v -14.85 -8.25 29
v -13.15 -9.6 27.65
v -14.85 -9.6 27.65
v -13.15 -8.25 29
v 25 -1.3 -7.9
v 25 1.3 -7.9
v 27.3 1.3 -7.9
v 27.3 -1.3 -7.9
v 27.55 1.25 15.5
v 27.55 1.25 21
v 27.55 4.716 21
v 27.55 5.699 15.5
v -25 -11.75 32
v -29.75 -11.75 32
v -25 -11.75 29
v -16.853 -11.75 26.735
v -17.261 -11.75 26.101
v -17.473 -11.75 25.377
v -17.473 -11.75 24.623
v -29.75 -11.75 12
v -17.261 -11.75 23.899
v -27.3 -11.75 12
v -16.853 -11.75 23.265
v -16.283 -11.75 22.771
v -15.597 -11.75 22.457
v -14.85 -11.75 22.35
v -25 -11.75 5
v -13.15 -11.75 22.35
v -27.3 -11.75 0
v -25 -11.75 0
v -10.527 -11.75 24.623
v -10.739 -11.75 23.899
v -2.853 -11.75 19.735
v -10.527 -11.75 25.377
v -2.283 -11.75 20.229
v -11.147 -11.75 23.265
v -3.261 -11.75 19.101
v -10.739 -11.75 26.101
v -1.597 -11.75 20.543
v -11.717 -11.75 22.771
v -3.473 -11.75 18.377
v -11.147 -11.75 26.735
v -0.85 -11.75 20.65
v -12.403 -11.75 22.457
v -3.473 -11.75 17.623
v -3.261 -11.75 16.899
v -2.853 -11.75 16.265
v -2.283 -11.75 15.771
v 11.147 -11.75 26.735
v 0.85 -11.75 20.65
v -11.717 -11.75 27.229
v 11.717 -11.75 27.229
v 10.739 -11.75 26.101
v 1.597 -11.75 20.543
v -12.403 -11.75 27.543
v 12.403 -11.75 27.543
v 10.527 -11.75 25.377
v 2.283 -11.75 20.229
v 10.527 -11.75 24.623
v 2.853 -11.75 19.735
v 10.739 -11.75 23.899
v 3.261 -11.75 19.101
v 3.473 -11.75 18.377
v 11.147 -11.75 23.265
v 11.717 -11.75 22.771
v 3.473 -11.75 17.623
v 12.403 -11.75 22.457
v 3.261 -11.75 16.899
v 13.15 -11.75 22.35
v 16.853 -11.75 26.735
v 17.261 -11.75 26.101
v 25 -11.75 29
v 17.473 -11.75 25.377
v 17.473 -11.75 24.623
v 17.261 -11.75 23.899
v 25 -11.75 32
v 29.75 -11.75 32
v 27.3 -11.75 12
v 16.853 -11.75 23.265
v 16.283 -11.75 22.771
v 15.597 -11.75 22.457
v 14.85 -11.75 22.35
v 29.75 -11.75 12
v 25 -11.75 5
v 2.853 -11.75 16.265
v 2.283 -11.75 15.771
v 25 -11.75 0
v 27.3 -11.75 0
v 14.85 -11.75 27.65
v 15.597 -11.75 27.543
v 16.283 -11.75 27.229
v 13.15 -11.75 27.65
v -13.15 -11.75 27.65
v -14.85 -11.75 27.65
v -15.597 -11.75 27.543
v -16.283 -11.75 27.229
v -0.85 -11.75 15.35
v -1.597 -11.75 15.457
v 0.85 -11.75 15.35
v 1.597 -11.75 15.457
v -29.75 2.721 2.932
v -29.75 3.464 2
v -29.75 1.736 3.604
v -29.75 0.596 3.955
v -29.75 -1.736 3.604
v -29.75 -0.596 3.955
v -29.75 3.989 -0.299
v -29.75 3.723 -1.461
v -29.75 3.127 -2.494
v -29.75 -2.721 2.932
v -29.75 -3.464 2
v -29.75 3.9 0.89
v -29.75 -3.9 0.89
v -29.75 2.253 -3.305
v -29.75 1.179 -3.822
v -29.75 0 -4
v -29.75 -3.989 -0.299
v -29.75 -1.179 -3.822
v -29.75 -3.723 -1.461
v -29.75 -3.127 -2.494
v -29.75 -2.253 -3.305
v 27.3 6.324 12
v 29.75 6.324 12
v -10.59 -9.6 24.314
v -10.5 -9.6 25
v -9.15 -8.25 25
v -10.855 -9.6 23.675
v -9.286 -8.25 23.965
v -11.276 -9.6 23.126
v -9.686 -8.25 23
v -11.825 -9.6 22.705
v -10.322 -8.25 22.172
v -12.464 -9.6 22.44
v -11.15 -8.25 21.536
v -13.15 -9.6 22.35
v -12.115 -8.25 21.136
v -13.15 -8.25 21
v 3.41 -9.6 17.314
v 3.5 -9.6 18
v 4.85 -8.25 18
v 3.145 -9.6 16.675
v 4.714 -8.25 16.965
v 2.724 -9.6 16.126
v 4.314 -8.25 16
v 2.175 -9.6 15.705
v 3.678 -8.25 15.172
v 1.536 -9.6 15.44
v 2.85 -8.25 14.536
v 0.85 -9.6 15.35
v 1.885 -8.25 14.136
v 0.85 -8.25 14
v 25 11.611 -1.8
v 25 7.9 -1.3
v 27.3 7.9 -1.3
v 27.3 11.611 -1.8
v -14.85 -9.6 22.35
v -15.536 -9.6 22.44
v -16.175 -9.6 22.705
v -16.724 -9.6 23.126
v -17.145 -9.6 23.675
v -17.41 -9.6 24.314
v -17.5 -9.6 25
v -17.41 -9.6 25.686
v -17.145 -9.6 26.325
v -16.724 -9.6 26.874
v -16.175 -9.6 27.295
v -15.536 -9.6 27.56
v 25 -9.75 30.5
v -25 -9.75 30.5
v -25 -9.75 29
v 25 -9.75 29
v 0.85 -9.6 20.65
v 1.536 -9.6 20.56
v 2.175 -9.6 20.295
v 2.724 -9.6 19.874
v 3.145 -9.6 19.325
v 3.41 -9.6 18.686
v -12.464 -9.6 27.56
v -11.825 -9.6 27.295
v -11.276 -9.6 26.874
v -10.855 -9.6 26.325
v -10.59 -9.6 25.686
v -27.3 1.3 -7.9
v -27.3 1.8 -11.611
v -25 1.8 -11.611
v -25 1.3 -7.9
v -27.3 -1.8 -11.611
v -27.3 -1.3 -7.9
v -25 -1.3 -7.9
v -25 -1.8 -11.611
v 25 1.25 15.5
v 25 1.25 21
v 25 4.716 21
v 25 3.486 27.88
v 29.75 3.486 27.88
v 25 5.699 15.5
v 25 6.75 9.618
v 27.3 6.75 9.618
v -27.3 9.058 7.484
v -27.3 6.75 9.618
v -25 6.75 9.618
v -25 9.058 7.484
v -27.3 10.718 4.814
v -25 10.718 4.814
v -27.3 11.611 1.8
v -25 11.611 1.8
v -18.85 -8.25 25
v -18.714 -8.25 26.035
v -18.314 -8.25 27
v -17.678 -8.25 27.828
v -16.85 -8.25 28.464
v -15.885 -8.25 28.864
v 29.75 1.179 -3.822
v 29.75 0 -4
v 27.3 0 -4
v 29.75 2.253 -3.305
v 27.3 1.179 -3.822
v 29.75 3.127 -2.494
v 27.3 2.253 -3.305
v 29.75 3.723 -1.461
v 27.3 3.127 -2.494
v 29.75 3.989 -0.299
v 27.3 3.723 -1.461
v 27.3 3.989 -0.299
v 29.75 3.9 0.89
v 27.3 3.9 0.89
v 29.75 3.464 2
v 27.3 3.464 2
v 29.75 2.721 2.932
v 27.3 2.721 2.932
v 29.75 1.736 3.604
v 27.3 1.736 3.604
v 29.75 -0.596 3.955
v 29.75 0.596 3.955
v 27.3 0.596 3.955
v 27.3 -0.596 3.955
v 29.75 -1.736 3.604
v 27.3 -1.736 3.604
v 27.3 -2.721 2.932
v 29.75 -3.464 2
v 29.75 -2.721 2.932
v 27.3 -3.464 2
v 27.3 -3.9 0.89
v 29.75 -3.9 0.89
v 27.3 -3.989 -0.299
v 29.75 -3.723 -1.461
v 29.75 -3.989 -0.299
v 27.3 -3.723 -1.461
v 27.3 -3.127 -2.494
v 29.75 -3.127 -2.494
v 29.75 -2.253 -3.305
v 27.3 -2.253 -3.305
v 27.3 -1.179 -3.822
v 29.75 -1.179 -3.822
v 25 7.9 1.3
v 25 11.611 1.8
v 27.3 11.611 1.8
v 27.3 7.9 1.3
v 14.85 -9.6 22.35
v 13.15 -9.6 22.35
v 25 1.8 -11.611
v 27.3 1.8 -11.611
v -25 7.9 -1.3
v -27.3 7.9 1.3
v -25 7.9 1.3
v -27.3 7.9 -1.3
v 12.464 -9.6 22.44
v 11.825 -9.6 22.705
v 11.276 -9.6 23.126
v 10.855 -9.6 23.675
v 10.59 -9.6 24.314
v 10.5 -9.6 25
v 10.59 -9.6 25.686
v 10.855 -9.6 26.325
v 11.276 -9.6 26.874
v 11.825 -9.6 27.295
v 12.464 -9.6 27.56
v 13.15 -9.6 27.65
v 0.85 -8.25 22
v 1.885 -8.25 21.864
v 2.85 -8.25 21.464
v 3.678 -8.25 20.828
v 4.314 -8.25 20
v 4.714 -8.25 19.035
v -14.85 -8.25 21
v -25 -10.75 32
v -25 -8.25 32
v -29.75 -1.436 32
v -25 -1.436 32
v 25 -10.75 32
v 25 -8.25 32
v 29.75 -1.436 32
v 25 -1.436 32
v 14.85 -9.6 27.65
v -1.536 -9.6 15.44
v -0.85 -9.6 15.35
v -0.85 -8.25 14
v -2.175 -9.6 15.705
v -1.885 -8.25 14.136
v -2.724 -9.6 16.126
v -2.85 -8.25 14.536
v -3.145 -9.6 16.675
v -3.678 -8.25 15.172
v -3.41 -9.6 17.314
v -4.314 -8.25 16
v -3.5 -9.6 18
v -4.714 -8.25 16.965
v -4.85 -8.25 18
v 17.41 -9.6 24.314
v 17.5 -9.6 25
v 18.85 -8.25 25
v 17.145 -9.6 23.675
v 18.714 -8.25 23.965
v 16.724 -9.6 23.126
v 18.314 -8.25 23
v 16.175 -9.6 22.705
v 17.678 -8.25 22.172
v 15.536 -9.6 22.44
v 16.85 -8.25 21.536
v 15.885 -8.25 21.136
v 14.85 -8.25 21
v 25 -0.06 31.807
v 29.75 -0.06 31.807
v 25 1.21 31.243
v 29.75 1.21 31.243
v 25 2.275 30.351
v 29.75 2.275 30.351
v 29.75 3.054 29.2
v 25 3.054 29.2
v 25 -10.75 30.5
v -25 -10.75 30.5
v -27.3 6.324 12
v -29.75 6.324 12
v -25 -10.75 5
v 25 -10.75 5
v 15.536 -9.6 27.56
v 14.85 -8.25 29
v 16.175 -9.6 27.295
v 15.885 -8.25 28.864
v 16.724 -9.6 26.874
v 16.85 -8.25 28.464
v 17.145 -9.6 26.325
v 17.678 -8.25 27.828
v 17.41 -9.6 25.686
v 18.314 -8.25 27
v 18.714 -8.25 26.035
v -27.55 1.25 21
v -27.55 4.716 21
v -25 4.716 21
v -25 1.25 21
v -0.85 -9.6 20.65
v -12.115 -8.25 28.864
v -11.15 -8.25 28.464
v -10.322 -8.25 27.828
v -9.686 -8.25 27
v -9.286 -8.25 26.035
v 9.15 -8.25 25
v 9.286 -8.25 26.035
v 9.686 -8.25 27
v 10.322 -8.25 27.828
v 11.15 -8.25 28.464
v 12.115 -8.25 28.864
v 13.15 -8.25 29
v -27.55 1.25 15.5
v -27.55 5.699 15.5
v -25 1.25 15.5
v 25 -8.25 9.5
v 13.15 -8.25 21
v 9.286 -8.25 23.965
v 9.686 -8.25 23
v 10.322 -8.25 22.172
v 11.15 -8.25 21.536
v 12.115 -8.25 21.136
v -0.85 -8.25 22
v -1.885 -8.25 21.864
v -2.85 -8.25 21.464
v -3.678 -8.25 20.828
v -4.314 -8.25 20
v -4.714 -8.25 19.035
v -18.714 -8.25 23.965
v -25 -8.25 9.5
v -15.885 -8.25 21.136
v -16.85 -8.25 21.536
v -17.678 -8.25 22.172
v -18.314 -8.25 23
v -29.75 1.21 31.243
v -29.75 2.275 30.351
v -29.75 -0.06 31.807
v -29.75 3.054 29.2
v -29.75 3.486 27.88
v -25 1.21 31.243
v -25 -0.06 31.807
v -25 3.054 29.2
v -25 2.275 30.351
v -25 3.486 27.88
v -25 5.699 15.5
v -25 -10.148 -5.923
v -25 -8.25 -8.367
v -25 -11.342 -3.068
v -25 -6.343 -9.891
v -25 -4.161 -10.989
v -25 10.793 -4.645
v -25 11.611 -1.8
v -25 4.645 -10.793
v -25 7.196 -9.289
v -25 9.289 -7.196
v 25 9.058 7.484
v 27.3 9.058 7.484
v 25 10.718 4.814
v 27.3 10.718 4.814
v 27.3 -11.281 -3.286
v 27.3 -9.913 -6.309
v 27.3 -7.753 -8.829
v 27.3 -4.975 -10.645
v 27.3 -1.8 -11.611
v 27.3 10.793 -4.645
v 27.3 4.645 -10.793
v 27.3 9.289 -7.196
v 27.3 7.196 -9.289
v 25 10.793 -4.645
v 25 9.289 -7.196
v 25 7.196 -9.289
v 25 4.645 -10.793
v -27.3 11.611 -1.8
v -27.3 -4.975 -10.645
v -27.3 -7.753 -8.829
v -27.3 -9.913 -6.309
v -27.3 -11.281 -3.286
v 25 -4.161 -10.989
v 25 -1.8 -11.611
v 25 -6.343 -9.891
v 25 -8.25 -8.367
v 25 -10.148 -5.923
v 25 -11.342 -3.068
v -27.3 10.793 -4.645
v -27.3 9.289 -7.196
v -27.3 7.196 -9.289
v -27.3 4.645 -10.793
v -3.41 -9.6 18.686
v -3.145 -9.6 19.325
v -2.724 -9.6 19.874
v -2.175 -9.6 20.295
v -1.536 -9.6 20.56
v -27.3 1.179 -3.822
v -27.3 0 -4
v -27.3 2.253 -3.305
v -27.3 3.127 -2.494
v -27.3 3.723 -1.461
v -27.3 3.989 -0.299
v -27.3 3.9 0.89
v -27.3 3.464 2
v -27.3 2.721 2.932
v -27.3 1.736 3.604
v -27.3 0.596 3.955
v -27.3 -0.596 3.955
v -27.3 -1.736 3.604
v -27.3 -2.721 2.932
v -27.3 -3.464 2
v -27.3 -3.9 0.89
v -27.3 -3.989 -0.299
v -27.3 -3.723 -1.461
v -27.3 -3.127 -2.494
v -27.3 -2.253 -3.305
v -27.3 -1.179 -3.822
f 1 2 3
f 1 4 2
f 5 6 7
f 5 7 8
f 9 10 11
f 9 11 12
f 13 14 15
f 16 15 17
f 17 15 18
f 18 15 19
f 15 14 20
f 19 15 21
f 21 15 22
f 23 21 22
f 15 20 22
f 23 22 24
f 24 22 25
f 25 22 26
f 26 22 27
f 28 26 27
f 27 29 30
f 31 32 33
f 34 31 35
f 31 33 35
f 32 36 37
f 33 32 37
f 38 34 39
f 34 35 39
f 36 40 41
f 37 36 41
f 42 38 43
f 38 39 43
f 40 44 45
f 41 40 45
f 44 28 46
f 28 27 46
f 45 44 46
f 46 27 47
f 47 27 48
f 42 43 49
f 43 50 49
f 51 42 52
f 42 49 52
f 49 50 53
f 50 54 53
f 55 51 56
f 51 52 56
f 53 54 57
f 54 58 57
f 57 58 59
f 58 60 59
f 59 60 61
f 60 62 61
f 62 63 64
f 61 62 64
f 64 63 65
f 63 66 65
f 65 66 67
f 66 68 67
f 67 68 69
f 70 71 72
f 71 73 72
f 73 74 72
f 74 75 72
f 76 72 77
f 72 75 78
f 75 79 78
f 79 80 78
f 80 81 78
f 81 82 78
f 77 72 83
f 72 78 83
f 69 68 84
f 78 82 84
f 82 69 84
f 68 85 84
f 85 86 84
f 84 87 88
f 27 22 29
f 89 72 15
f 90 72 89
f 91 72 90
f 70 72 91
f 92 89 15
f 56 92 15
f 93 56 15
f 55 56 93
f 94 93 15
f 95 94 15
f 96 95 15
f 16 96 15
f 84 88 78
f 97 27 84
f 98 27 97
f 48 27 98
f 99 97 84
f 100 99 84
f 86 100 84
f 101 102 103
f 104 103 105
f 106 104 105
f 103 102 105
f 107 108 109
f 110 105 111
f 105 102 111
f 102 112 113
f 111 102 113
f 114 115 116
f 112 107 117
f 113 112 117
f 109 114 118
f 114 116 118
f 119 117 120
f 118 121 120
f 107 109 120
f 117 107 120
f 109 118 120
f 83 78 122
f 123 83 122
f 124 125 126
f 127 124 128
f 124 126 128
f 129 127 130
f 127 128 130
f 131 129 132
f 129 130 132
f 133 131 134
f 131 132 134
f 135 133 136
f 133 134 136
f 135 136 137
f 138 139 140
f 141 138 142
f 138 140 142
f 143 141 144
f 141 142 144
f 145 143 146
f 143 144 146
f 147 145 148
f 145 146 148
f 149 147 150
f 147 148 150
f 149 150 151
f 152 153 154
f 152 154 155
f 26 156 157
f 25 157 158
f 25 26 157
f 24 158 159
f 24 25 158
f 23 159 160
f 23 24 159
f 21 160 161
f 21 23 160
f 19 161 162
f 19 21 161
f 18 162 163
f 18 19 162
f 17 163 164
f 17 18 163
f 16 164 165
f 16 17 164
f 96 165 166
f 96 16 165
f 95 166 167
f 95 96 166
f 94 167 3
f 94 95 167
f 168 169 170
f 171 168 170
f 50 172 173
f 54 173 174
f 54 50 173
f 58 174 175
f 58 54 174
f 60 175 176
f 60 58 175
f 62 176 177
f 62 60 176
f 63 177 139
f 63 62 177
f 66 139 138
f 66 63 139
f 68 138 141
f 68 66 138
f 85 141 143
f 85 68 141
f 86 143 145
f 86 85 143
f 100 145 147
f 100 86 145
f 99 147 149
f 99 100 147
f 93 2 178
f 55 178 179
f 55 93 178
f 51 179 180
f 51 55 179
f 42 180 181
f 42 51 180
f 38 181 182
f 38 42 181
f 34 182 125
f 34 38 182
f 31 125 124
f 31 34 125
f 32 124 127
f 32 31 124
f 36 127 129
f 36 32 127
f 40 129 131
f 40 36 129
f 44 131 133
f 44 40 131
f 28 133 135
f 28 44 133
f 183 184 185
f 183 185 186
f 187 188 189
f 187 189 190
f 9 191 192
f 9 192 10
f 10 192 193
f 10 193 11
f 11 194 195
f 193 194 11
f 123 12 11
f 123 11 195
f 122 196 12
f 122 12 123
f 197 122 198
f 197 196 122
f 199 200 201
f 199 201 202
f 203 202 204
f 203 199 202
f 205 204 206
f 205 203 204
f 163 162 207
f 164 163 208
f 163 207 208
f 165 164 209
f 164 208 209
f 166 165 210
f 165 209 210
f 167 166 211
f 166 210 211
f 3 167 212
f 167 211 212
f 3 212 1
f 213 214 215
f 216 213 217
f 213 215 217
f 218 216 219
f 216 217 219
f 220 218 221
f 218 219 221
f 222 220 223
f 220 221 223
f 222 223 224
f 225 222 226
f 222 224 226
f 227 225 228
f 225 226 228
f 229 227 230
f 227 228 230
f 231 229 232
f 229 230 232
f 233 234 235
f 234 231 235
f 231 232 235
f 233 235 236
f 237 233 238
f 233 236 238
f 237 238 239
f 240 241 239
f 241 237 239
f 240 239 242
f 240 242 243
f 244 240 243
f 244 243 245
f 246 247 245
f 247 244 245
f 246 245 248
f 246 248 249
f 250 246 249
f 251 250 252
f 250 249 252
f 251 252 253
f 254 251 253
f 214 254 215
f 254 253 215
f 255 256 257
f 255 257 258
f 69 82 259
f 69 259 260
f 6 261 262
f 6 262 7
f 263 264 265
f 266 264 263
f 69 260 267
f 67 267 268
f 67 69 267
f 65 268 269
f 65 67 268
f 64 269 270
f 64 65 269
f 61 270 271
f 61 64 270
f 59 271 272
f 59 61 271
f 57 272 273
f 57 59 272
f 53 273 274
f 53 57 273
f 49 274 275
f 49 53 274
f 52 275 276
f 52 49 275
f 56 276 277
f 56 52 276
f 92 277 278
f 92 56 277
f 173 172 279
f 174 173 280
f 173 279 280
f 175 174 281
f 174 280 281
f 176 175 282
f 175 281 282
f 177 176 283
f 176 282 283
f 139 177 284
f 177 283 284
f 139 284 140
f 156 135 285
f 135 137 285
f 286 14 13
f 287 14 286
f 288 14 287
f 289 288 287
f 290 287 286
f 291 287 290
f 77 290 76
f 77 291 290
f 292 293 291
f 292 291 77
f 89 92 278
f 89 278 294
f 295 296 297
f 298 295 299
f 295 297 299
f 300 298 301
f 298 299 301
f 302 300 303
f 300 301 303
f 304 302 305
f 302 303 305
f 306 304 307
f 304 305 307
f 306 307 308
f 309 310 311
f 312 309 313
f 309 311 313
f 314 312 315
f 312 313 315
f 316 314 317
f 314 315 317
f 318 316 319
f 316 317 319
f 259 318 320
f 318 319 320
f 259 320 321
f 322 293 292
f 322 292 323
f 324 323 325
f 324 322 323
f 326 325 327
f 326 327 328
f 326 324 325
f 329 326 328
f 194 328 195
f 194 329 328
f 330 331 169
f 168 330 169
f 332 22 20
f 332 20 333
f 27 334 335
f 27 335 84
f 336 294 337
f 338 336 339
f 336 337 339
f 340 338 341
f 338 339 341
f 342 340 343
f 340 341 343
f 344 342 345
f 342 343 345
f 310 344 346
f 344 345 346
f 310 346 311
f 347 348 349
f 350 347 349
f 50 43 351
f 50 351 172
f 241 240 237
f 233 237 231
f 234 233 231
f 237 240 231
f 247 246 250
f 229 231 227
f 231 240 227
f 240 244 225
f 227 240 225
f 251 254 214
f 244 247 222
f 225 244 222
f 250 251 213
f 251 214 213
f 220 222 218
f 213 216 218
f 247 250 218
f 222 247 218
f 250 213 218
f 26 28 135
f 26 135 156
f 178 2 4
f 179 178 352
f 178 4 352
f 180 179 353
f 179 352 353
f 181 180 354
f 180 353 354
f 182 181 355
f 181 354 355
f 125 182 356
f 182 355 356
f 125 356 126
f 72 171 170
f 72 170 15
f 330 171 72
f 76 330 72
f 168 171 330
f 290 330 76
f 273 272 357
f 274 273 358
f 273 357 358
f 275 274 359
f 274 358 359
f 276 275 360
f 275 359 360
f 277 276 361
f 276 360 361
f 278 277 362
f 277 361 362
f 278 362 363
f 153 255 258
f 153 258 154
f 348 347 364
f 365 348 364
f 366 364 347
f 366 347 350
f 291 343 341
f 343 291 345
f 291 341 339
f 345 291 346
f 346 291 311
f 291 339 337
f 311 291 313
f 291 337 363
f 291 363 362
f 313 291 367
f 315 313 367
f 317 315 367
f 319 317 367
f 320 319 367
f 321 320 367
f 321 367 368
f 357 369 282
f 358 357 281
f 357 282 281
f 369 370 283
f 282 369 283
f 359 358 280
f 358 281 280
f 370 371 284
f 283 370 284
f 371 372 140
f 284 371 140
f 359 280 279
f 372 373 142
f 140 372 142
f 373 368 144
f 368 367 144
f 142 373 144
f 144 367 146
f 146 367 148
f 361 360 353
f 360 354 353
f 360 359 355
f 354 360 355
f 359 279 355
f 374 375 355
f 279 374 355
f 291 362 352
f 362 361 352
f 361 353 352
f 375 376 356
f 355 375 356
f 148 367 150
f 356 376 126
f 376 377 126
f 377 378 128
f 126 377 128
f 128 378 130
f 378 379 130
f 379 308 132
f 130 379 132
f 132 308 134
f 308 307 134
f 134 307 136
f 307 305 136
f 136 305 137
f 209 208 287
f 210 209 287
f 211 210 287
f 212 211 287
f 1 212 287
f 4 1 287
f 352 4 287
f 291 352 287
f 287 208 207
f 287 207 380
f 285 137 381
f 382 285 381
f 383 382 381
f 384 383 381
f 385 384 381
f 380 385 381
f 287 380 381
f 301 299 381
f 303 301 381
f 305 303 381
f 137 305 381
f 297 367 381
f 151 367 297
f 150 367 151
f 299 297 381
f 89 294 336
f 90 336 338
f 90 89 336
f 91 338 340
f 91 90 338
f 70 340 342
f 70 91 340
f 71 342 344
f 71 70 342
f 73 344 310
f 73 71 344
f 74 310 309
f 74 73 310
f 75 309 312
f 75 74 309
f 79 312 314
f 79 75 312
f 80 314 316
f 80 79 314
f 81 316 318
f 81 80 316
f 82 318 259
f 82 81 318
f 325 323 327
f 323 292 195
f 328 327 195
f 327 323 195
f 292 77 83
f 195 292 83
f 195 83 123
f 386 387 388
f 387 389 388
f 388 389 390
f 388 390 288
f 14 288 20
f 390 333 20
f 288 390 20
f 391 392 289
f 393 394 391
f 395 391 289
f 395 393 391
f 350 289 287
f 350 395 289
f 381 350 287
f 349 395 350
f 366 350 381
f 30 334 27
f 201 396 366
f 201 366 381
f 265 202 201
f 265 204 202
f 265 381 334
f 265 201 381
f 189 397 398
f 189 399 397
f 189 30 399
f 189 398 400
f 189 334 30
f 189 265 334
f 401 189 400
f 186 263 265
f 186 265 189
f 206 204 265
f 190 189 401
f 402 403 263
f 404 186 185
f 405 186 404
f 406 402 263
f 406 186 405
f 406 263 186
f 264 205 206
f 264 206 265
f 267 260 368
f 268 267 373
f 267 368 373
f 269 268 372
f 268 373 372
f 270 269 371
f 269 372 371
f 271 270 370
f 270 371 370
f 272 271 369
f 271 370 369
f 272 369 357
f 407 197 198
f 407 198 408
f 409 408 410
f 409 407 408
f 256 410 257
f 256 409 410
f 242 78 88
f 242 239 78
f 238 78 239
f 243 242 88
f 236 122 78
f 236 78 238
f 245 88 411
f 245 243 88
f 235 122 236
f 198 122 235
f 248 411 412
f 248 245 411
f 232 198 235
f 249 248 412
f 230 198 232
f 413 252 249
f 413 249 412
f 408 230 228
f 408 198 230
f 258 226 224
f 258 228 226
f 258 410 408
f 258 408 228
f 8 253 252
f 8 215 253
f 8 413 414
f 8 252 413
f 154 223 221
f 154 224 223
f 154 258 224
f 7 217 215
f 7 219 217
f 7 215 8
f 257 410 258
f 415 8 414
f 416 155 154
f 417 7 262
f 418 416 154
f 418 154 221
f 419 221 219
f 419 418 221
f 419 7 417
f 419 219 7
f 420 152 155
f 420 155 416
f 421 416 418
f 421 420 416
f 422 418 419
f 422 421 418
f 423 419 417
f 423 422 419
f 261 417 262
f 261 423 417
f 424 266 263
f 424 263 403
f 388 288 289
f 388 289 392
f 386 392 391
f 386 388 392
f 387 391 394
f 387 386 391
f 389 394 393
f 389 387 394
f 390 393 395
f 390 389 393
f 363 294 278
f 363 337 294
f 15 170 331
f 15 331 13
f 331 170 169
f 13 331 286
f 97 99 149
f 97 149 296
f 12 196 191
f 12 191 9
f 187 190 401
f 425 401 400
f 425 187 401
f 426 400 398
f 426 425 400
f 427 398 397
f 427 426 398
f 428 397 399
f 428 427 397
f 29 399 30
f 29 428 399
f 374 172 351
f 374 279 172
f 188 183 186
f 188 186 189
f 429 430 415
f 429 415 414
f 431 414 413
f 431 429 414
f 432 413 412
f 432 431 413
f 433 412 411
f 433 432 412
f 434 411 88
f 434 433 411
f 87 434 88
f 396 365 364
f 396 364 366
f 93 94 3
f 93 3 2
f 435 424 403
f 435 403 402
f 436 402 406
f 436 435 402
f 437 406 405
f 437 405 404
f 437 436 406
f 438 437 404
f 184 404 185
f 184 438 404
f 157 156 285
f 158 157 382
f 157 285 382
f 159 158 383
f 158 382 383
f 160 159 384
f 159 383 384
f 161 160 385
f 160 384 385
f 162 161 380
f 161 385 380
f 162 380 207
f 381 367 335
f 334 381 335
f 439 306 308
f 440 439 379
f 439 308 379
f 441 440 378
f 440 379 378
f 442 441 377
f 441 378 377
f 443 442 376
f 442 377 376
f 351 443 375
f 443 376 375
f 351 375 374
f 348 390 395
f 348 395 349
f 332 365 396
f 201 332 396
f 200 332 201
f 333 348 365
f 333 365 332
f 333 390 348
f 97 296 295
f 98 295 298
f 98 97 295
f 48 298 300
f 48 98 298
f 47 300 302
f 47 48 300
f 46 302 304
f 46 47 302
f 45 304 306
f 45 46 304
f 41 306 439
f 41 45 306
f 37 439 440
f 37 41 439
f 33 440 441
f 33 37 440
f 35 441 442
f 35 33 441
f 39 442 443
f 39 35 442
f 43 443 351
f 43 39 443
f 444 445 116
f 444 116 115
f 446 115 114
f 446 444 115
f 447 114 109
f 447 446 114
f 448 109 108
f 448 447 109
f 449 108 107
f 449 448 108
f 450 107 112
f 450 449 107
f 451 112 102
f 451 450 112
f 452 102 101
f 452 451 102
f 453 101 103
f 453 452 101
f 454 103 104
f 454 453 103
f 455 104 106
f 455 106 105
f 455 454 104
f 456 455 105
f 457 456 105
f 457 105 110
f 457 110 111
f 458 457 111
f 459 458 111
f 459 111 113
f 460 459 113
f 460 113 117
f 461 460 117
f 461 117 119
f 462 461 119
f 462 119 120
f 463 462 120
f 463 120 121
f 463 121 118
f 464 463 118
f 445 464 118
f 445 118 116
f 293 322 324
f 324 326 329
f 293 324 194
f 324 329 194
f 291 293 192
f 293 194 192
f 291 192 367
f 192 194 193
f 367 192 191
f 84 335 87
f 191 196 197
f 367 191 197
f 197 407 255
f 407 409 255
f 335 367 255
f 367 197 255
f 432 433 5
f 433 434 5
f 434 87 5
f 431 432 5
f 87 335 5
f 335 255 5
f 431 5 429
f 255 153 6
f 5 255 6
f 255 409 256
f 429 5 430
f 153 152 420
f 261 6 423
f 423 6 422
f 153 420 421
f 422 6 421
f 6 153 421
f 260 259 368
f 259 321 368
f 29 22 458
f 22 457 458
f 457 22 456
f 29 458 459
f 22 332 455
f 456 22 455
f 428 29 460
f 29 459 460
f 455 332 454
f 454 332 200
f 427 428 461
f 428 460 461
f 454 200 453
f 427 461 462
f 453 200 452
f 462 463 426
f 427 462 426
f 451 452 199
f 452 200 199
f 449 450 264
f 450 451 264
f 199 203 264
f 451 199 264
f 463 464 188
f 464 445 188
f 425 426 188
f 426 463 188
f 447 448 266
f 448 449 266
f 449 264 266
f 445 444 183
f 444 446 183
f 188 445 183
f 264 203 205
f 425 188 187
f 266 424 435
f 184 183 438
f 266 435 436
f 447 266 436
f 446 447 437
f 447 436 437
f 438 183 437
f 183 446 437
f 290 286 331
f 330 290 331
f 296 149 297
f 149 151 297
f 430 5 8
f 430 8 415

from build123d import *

# Parameters (mm, degrees)
BODY_DEPTH                       = 32
BODY_DEPTH_BACK                  = 15
PIVOT_START                      = 25
PIVOT_PIN_R_SKETCH_R             = 4
PIVOT_PIN_R_DEPTH                = 4.25
OUTSIDE_SHAPE_CUT_OUT_DEPTH      = 46.245165488
OUTSIDE_SHAPE_CUT_OUT_DEPTH_BACK = 46.245165488
OUTSIDE_SHAPE_CUT_OUT_SKETCH_W   = 49
OUTSIDE_SHAPE_CUT_OUT_SKETCH_H   = 25.5
OUTSIDE_START                    = 27.3
OUTSIDE_SHAPE_CUT_OUT_SKETCH_R_W = 24
OUTSIDE_SHAPE_CUT_OUT_SKETCH_R_H = 24
OUTSIDE_SHAPE_CUT_OUT_SKETCH_R_R = 4
OUTSIDE_SHAPE_CUT_OUT_R_DEPTH    = 18.945165488
INSIDE_START                     = 25
INSIDE_SHAPE_CUT_OUT_DEPTH       = 50
LIGHTENING_START                 = 1.25
LIGHTENING_2_SKETCH_W            = 55.1
LIGHTENING_2_SKETCH_H            = 5.5
LIGHTENING_2_DEPTH               = 44.995165488
F_3_START                        = -11.75
F_3_M5_SLOTS_DEPTH               = 3.5


with BuildPart() as part:
    # Profile Sketch → Body (new, two sides: drawn at the far end of the back side and taken through both)
    with BuildSketch(Plane.XY.offset(-BODY_DEPTH_BACK)):
        Polygon((-29.75, -11.75), (29.75, -11.75), (29.75, 11.75), (25, 11.75), (25, -8.25), (-25, -8.25), (-25, 11.75), (-29.75, 11.75), align=None)
    extrude(amount=BODY_DEPTH + BODY_DEPTH_BACK)

    # Pivot Pin R Sketch → Pivot Pin R (add)
    with BuildSketch(Plane(origin=(0, 0, 0), x_dir=(0, 0, -1), z_dir=(1, 0, 0)).offset(PIVOT_START)):
        Circle(PIVOT_PIN_R_SKETCH_R)
    pivot_pin_r = extrude(amount=PIVOT_PIN_R_DEPTH)

    # Pivot Pin L: Pivot Pin R across plane
    add(pivot_pin_r.mirror(Plane(origin=(0, 0, 0), x_dir=(0, 0, 1), z_dir=(1, 0, 0))))

    # Outside Shape Cut Out Sketch → Outside Shape Cut Out (cut, two sides: drawn at the far end of the back side and taken through both)
    with BuildSketch(Plane(origin=(0, 0, 0), x_dir=(0, 0, -1), z_dir=(1, 0, 0)).offset(-OUTSIDE_SHAPE_CUT_OUT_DEPTH_BACK)):
        with Locations((-9.5, -1)):
            Rectangle(OUTSIDE_SHAPE_CUT_OUT_SKETCH_W, OUTSIDE_SHAPE_CUT_OUT_SKETCH_H)
        with BuildLine():
            Line((-27.879626464, 3.486362585), (-9.617692031, 6.75))
            ThreePointArc((-9.617692031, 6.75), (-6.204756601, 9.978150907), (-1.8, 11.611309142))
            Line((-1.8, 11.611309142), (-1.3, 7.9))
            Line((-1.3, 7.9), (1.3, 7.9))
            Line((1.3, 7.9), (1.8, 11.611309142))
            ThreePointArc((1.8, 11.611309142), (8.308504679, 8.308504679), (11.611309142, 1.8))
            Line((11.611309142, 1.8), (7.9, 1.3))
            Line((7.9, 1.3), (7.9, -1.3))
            Line((7.9, -1.3), (11.611309142, -1.8))
            ThreePointArc((11.611309142, -1.8), (7.645668708, -8.922233465), (0, -11.75))
            Line((0, -11.75), (-32, -11.75))
            Line((-32, -11.75), (-32, -1.435655018))
            ThreePointArc((-32, -1.435655018), (-30.833936118, 1.773851772), (-27.879626464, 3.486362585))
        make_face(mode=Mode.SUBTRACT)
    extrude(amount=OUTSIDE_SHAPE_CUT_OUT_DEPTH + OUTSIDE_SHAPE_CUT_OUT_DEPTH_BACK, mode=Mode.SUBTRACT)

    # Outside Shape Cut Out Sketch R → Outside Shape Cut Out R (cut, through all)
    with BuildSketch(Plane(origin=(0, 0, 0), x_dir=(0, 0, -1), z_dir=(1, 0, 0)).offset(OUTSIDE_START)):
        Rectangle(OUTSIDE_SHAPE_CUT_OUT_SKETCH_R_W, OUTSIDE_SHAPE_CUT_OUT_SKETCH_R_H)
        Circle(OUTSIDE_SHAPE_CUT_OUT_SKETCH_R_R, mode=Mode.SUBTRACT)
    outside_shape_cut_out_r = extrude(amount=OUTSIDE_SHAPE_CUT_OUT_R_DEPTH, mode=Mode.SUBTRACT)

    # Outside Shape Cut Out L: Outside Shape Cut Out R across plane
    add(outside_shape_cut_out_r.mirror(Plane(origin=(0, 0, 0), x_dir=(0, 0, 1), z_dir=(1, 0, 0))), mode=Mode.SUBTRACT)

    # Inside Shape Cut Out Sketch → Inside Shape Cut Out (cut)
    with BuildSketch(Plane(origin=(0, 0, 0), x_dir=(0, 0, -1), z_dir=(1, 0, 0)).offset(INSIDE_START)):
        Polygon((-29, -9.75), (-29, -11.75), (-32, -11.75), (-32, -10.75), (-30.5, -10.75), (-30.5, -9.75), align=None)
        Polygon((-9.5, -8.25), (-5, -10.75), (-5, -11.75), (8.366600265, -11.75), (8.366600265, -8.25), align=None)
    extrude(amount=-INSIDE_SHAPE_CUT_OUT_DEPTH, mode=Mode.SUBTRACT)

    # Lightening 2 Sketch → Lightening 2 (cut, through all)
    with BuildSketch(Plane(origin=(0, 0, 0), x_dir=(1, 0, 0), z_dir=(0, 1, 0)).offset(LIGHTENING_START)):
        with Locations((0, -18.25)):
            Rectangle(LIGHTENING_2_SKETCH_W, LIGHTENING_2_SKETCH_H)
    extrude(amount=LIGHTENING_2_DEPTH, mode=Mode.SUBTRACT)

    # 3 M5 Slots: read off the stored shape, not the designer's step
    # 3 M5 Slots outline → 3 M5 Slots (cut)
    with BuildSketch(Plane(origin=(0, 0, 0), x_dir=(1, 0, 0), z_dir=(0, 1, 0)).offset(F_3_START)):
        with BuildLine():
            Line((-0.85, -20.65), (0.85, -20.65))
            ThreePointArc((0.85, -20.65), (3.5, -18), (0.85, -15.35))
            Line((0.85, -15.35), (-0.85, -15.35))
            ThreePointArc((-0.85, -15.35), (-3.5, -18), (-0.85, -20.65))
        make_face()
        with BuildLine():
            Line((13.15, -27.65), (14.85, -27.65))
            ThreePointArc((14.85, -27.65), (17.5, -25), (14.85, -22.35))
            Line((14.85, -22.35), (13.15, -22.35))
            ThreePointArc((13.15, -22.35), (10.5, -25), (13.15, -27.65))
        make_face()
        with BuildLine():
            ThreePointArc((-13.15, -27.65), (-10.5, -25), (-13.15, -22.35))
            Line((-13.15, -22.35), (-14.85, -22.35))
            ThreePointArc((-14.85, -22.35), (-17.5, -25), (-14.85, -27.65))
            Line((-14.85, -27.65), (-13.15, -27.65))
        make_face()
    extrude(amount=F_3_M5_SLOTS_DEPTH, mode=Mode.SUBTRACT)

    # 3 M5 Slots 2: loft between two sections, ruled curve by curve
    f_3_m5_slots_2_from = [
        Edge.make_three_point_arc((0.85, -9.6, 20.65), (2.72383297, -9.6, 19.87383297), (3.5, -9.6, 18)),
        Edge.make_three_point_arc((3.5, -9.6, 18), (2.72383297, -9.6, 16.12616703), (0.85, -9.6, 15.35)),
        Edge.make_three_point_arc((-0.85, -9.6, 15.35), (-2.72383297, -9.6, 16.12616703), (-3.5, -9.6, 18)),
        Edge.make_three_point_arc((-3.5, -9.6, 18), (-2.72383297, -9.6, 19.87383297), (-0.85, -9.6, 20.65)),
        Edge.make_line((0.85, -9.6, 15.35), (-0.85, -9.6, 15.35)),
        Edge.make_line((0.85, -9.6, 20.65), (-0.85, -9.6, 20.65)),
    ]
    f_3_m5_slots_2_to = [
        Edge.make_three_point_arc((0.85, -8.25, 22), (3.678427125, -8.25, 20.828427125), (4.85, -8.25, 18)),
        Edge.make_three_point_arc((4.85, -8.25, 18), (3.678427125, -8.25, 15.171572875), (0.85, -8.25, 14)),
        Edge.make_three_point_arc((-0.85, -8.25, 14), (-3.678427125, -8.25, 15.171572875), (-4.85, -8.25, 18)),
        Edge.make_three_point_arc((-4.85, -8.25, 18), (-3.678427125, -8.25, 20.828427125), (-0.85, -8.25, 22)),
        Edge.make_line((0.85, -8.25, 14), (-0.85, -8.25, 14)),
        Edge.make_line((0.85, -8.25, 22), (-0.85, -8.25, 22)),
    ]
    f_3_m5_slots_2 = Solid(Shell([*[Face.make_surface_from_curves(f_3_m5_slots_2_from[k], f_3_m5_slots_2_to[k]) for k in range(6)], Face(Wire(f_3_m5_slots_2_from)), Face(Wire(f_3_m5_slots_2_to))]))
    add(f_3_m5_slots_2, mode=Mode.SUBTRACT)

    # 3 M5 Slots 3: loft between two sections, ruled curve by curve
    f_3_m5_slots_3_from = [
        Edge.make_three_point_arc((14.85, -9.6, 27.65), (16.72383297, -9.6, 26.87383297), (17.5, -9.6, 25)),
        Edge.make_three_point_arc((17.5, -9.6, 25), (16.72383297, -9.6, 23.12616703), (14.85, -9.6, 22.35)),
        Edge.make_three_point_arc((13.15, -9.6, 22.35), (11.27616703, -9.6, 23.12616703), (10.5, -9.6, 25)),
        Edge.make_three_point_arc((10.5, -9.6, 25), (11.27616703, -9.6, 26.87383297), (13.15, -9.6, 27.65)),
        Edge.make_line((14.85, -9.6, 22.35), (13.15, -9.6, 22.35)),
        Edge.make_line((14.85, -9.6, 27.65), (13.15, -9.6, 27.65)),
    ]
    f_3_m5_slots_3_to = [
        Edge.make_three_point_arc((14.85, -8.25, 29), (17.678427125, -8.25, 27.828427125), (18.85, -8.25, 25)),
        Edge.make_three_point_arc((18.85, -8.25, 25), (17.678427125, -8.25, 22.171572875), (14.85, -8.25, 21)),
        Edge.make_three_point_arc((13.15, -8.25, 21), (10.321572875, -8.25, 22.171572875), (9.15, -8.25, 25)),
        Edge.make_three_point_arc((9.15, -8.25, 25), (10.321572875, -8.25, 27.828427125), (13.15, -8.25, 29)),
        Edge.make_line((14.85, -8.25, 21), (13.15, -8.25, 21)),
        Edge.make_line((14.85, -8.25, 29), (13.15, -8.25, 29)),
    ]
    f_3_m5_slots_3 = Solid(Shell([*[Face.make_surface_from_curves(f_3_m5_slots_3_from[k], f_3_m5_slots_3_to[k]) for k in range(6)], Face(Wire(f_3_m5_slots_3_from)), Face(Wire(f_3_m5_slots_3_to))]))
    add(f_3_m5_slots_3, mode=Mode.SUBTRACT)

    # 3 M5 Slots 4: loft between two sections, ruled curve by curve
    f_3_m5_slots_4_from = [
        Edge.make_three_point_arc((-13.15, -9.6, 27.65), (-11.27616703, -9.6, 26.87383297), (-10.5, -9.6, 25)),
        Edge.make_three_point_arc((-10.5, -9.6, 25), (-11.27616703, -9.6, 23.12616703), (-13.15, -9.6, 22.35)),
        Edge.make_three_point_arc((-14.85, -9.6, 22.35), (-16.72383297, -9.6, 23.12616703), (-17.5, -9.6, 25)),
        Edge.make_three_point_arc((-17.5, -9.6, 25), (-16.72383297, -9.6, 26.87383297), (-14.85, -9.6, 27.65)),
        Edge.make_line((-13.15, -9.6, 22.35), (-14.85, -9.6, 22.35)),
        Edge.make_line((-13.15, -9.6, 27.65), (-14.85, -9.6, 27.65)),
    ]
    f_3_m5_slots_4_to = [
        Edge.make_three_point_arc((-13.15, -8.25, 29), (-10.321572875, -8.25, 27.828427125), (-9.15, -8.25, 25)),
        Edge.make_three_point_arc((-9.15, -8.25, 25), (-10.321572875, -8.25, 22.171572875), (-13.15, -8.25, 21)),
        Edge.make_three_point_arc((-14.85, -8.25, 21), (-17.678427125, -8.25, 22.171572875), (-18.85, -8.25, 25)),
        Edge.make_three_point_arc((-18.85, -8.25, 25), (-17.678427125, -8.25, 27.828427125), (-14.85, -8.25, 29)),
        Edge.make_line((-13.15, -8.25, 21), (-14.85, -8.25, 21)),
        Edge.make_line((-13.15, -8.25, 29), (-14.85, -8.25, 29)),
    ]
    f_3_m5_slots_4 = Solid(Shell([*[Face.make_surface_from_curves(f_3_m5_slots_4_from[k], f_3_m5_slots_4_to[k]) for k in range(6)], Face(Wire(f_3_m5_slots_4_from)), Face(Wire(f_3_m5_slots_4_to))]))
    add(f_3_m5_slots_4, mode=Mode.SUBTRACT)


solid = part.part
